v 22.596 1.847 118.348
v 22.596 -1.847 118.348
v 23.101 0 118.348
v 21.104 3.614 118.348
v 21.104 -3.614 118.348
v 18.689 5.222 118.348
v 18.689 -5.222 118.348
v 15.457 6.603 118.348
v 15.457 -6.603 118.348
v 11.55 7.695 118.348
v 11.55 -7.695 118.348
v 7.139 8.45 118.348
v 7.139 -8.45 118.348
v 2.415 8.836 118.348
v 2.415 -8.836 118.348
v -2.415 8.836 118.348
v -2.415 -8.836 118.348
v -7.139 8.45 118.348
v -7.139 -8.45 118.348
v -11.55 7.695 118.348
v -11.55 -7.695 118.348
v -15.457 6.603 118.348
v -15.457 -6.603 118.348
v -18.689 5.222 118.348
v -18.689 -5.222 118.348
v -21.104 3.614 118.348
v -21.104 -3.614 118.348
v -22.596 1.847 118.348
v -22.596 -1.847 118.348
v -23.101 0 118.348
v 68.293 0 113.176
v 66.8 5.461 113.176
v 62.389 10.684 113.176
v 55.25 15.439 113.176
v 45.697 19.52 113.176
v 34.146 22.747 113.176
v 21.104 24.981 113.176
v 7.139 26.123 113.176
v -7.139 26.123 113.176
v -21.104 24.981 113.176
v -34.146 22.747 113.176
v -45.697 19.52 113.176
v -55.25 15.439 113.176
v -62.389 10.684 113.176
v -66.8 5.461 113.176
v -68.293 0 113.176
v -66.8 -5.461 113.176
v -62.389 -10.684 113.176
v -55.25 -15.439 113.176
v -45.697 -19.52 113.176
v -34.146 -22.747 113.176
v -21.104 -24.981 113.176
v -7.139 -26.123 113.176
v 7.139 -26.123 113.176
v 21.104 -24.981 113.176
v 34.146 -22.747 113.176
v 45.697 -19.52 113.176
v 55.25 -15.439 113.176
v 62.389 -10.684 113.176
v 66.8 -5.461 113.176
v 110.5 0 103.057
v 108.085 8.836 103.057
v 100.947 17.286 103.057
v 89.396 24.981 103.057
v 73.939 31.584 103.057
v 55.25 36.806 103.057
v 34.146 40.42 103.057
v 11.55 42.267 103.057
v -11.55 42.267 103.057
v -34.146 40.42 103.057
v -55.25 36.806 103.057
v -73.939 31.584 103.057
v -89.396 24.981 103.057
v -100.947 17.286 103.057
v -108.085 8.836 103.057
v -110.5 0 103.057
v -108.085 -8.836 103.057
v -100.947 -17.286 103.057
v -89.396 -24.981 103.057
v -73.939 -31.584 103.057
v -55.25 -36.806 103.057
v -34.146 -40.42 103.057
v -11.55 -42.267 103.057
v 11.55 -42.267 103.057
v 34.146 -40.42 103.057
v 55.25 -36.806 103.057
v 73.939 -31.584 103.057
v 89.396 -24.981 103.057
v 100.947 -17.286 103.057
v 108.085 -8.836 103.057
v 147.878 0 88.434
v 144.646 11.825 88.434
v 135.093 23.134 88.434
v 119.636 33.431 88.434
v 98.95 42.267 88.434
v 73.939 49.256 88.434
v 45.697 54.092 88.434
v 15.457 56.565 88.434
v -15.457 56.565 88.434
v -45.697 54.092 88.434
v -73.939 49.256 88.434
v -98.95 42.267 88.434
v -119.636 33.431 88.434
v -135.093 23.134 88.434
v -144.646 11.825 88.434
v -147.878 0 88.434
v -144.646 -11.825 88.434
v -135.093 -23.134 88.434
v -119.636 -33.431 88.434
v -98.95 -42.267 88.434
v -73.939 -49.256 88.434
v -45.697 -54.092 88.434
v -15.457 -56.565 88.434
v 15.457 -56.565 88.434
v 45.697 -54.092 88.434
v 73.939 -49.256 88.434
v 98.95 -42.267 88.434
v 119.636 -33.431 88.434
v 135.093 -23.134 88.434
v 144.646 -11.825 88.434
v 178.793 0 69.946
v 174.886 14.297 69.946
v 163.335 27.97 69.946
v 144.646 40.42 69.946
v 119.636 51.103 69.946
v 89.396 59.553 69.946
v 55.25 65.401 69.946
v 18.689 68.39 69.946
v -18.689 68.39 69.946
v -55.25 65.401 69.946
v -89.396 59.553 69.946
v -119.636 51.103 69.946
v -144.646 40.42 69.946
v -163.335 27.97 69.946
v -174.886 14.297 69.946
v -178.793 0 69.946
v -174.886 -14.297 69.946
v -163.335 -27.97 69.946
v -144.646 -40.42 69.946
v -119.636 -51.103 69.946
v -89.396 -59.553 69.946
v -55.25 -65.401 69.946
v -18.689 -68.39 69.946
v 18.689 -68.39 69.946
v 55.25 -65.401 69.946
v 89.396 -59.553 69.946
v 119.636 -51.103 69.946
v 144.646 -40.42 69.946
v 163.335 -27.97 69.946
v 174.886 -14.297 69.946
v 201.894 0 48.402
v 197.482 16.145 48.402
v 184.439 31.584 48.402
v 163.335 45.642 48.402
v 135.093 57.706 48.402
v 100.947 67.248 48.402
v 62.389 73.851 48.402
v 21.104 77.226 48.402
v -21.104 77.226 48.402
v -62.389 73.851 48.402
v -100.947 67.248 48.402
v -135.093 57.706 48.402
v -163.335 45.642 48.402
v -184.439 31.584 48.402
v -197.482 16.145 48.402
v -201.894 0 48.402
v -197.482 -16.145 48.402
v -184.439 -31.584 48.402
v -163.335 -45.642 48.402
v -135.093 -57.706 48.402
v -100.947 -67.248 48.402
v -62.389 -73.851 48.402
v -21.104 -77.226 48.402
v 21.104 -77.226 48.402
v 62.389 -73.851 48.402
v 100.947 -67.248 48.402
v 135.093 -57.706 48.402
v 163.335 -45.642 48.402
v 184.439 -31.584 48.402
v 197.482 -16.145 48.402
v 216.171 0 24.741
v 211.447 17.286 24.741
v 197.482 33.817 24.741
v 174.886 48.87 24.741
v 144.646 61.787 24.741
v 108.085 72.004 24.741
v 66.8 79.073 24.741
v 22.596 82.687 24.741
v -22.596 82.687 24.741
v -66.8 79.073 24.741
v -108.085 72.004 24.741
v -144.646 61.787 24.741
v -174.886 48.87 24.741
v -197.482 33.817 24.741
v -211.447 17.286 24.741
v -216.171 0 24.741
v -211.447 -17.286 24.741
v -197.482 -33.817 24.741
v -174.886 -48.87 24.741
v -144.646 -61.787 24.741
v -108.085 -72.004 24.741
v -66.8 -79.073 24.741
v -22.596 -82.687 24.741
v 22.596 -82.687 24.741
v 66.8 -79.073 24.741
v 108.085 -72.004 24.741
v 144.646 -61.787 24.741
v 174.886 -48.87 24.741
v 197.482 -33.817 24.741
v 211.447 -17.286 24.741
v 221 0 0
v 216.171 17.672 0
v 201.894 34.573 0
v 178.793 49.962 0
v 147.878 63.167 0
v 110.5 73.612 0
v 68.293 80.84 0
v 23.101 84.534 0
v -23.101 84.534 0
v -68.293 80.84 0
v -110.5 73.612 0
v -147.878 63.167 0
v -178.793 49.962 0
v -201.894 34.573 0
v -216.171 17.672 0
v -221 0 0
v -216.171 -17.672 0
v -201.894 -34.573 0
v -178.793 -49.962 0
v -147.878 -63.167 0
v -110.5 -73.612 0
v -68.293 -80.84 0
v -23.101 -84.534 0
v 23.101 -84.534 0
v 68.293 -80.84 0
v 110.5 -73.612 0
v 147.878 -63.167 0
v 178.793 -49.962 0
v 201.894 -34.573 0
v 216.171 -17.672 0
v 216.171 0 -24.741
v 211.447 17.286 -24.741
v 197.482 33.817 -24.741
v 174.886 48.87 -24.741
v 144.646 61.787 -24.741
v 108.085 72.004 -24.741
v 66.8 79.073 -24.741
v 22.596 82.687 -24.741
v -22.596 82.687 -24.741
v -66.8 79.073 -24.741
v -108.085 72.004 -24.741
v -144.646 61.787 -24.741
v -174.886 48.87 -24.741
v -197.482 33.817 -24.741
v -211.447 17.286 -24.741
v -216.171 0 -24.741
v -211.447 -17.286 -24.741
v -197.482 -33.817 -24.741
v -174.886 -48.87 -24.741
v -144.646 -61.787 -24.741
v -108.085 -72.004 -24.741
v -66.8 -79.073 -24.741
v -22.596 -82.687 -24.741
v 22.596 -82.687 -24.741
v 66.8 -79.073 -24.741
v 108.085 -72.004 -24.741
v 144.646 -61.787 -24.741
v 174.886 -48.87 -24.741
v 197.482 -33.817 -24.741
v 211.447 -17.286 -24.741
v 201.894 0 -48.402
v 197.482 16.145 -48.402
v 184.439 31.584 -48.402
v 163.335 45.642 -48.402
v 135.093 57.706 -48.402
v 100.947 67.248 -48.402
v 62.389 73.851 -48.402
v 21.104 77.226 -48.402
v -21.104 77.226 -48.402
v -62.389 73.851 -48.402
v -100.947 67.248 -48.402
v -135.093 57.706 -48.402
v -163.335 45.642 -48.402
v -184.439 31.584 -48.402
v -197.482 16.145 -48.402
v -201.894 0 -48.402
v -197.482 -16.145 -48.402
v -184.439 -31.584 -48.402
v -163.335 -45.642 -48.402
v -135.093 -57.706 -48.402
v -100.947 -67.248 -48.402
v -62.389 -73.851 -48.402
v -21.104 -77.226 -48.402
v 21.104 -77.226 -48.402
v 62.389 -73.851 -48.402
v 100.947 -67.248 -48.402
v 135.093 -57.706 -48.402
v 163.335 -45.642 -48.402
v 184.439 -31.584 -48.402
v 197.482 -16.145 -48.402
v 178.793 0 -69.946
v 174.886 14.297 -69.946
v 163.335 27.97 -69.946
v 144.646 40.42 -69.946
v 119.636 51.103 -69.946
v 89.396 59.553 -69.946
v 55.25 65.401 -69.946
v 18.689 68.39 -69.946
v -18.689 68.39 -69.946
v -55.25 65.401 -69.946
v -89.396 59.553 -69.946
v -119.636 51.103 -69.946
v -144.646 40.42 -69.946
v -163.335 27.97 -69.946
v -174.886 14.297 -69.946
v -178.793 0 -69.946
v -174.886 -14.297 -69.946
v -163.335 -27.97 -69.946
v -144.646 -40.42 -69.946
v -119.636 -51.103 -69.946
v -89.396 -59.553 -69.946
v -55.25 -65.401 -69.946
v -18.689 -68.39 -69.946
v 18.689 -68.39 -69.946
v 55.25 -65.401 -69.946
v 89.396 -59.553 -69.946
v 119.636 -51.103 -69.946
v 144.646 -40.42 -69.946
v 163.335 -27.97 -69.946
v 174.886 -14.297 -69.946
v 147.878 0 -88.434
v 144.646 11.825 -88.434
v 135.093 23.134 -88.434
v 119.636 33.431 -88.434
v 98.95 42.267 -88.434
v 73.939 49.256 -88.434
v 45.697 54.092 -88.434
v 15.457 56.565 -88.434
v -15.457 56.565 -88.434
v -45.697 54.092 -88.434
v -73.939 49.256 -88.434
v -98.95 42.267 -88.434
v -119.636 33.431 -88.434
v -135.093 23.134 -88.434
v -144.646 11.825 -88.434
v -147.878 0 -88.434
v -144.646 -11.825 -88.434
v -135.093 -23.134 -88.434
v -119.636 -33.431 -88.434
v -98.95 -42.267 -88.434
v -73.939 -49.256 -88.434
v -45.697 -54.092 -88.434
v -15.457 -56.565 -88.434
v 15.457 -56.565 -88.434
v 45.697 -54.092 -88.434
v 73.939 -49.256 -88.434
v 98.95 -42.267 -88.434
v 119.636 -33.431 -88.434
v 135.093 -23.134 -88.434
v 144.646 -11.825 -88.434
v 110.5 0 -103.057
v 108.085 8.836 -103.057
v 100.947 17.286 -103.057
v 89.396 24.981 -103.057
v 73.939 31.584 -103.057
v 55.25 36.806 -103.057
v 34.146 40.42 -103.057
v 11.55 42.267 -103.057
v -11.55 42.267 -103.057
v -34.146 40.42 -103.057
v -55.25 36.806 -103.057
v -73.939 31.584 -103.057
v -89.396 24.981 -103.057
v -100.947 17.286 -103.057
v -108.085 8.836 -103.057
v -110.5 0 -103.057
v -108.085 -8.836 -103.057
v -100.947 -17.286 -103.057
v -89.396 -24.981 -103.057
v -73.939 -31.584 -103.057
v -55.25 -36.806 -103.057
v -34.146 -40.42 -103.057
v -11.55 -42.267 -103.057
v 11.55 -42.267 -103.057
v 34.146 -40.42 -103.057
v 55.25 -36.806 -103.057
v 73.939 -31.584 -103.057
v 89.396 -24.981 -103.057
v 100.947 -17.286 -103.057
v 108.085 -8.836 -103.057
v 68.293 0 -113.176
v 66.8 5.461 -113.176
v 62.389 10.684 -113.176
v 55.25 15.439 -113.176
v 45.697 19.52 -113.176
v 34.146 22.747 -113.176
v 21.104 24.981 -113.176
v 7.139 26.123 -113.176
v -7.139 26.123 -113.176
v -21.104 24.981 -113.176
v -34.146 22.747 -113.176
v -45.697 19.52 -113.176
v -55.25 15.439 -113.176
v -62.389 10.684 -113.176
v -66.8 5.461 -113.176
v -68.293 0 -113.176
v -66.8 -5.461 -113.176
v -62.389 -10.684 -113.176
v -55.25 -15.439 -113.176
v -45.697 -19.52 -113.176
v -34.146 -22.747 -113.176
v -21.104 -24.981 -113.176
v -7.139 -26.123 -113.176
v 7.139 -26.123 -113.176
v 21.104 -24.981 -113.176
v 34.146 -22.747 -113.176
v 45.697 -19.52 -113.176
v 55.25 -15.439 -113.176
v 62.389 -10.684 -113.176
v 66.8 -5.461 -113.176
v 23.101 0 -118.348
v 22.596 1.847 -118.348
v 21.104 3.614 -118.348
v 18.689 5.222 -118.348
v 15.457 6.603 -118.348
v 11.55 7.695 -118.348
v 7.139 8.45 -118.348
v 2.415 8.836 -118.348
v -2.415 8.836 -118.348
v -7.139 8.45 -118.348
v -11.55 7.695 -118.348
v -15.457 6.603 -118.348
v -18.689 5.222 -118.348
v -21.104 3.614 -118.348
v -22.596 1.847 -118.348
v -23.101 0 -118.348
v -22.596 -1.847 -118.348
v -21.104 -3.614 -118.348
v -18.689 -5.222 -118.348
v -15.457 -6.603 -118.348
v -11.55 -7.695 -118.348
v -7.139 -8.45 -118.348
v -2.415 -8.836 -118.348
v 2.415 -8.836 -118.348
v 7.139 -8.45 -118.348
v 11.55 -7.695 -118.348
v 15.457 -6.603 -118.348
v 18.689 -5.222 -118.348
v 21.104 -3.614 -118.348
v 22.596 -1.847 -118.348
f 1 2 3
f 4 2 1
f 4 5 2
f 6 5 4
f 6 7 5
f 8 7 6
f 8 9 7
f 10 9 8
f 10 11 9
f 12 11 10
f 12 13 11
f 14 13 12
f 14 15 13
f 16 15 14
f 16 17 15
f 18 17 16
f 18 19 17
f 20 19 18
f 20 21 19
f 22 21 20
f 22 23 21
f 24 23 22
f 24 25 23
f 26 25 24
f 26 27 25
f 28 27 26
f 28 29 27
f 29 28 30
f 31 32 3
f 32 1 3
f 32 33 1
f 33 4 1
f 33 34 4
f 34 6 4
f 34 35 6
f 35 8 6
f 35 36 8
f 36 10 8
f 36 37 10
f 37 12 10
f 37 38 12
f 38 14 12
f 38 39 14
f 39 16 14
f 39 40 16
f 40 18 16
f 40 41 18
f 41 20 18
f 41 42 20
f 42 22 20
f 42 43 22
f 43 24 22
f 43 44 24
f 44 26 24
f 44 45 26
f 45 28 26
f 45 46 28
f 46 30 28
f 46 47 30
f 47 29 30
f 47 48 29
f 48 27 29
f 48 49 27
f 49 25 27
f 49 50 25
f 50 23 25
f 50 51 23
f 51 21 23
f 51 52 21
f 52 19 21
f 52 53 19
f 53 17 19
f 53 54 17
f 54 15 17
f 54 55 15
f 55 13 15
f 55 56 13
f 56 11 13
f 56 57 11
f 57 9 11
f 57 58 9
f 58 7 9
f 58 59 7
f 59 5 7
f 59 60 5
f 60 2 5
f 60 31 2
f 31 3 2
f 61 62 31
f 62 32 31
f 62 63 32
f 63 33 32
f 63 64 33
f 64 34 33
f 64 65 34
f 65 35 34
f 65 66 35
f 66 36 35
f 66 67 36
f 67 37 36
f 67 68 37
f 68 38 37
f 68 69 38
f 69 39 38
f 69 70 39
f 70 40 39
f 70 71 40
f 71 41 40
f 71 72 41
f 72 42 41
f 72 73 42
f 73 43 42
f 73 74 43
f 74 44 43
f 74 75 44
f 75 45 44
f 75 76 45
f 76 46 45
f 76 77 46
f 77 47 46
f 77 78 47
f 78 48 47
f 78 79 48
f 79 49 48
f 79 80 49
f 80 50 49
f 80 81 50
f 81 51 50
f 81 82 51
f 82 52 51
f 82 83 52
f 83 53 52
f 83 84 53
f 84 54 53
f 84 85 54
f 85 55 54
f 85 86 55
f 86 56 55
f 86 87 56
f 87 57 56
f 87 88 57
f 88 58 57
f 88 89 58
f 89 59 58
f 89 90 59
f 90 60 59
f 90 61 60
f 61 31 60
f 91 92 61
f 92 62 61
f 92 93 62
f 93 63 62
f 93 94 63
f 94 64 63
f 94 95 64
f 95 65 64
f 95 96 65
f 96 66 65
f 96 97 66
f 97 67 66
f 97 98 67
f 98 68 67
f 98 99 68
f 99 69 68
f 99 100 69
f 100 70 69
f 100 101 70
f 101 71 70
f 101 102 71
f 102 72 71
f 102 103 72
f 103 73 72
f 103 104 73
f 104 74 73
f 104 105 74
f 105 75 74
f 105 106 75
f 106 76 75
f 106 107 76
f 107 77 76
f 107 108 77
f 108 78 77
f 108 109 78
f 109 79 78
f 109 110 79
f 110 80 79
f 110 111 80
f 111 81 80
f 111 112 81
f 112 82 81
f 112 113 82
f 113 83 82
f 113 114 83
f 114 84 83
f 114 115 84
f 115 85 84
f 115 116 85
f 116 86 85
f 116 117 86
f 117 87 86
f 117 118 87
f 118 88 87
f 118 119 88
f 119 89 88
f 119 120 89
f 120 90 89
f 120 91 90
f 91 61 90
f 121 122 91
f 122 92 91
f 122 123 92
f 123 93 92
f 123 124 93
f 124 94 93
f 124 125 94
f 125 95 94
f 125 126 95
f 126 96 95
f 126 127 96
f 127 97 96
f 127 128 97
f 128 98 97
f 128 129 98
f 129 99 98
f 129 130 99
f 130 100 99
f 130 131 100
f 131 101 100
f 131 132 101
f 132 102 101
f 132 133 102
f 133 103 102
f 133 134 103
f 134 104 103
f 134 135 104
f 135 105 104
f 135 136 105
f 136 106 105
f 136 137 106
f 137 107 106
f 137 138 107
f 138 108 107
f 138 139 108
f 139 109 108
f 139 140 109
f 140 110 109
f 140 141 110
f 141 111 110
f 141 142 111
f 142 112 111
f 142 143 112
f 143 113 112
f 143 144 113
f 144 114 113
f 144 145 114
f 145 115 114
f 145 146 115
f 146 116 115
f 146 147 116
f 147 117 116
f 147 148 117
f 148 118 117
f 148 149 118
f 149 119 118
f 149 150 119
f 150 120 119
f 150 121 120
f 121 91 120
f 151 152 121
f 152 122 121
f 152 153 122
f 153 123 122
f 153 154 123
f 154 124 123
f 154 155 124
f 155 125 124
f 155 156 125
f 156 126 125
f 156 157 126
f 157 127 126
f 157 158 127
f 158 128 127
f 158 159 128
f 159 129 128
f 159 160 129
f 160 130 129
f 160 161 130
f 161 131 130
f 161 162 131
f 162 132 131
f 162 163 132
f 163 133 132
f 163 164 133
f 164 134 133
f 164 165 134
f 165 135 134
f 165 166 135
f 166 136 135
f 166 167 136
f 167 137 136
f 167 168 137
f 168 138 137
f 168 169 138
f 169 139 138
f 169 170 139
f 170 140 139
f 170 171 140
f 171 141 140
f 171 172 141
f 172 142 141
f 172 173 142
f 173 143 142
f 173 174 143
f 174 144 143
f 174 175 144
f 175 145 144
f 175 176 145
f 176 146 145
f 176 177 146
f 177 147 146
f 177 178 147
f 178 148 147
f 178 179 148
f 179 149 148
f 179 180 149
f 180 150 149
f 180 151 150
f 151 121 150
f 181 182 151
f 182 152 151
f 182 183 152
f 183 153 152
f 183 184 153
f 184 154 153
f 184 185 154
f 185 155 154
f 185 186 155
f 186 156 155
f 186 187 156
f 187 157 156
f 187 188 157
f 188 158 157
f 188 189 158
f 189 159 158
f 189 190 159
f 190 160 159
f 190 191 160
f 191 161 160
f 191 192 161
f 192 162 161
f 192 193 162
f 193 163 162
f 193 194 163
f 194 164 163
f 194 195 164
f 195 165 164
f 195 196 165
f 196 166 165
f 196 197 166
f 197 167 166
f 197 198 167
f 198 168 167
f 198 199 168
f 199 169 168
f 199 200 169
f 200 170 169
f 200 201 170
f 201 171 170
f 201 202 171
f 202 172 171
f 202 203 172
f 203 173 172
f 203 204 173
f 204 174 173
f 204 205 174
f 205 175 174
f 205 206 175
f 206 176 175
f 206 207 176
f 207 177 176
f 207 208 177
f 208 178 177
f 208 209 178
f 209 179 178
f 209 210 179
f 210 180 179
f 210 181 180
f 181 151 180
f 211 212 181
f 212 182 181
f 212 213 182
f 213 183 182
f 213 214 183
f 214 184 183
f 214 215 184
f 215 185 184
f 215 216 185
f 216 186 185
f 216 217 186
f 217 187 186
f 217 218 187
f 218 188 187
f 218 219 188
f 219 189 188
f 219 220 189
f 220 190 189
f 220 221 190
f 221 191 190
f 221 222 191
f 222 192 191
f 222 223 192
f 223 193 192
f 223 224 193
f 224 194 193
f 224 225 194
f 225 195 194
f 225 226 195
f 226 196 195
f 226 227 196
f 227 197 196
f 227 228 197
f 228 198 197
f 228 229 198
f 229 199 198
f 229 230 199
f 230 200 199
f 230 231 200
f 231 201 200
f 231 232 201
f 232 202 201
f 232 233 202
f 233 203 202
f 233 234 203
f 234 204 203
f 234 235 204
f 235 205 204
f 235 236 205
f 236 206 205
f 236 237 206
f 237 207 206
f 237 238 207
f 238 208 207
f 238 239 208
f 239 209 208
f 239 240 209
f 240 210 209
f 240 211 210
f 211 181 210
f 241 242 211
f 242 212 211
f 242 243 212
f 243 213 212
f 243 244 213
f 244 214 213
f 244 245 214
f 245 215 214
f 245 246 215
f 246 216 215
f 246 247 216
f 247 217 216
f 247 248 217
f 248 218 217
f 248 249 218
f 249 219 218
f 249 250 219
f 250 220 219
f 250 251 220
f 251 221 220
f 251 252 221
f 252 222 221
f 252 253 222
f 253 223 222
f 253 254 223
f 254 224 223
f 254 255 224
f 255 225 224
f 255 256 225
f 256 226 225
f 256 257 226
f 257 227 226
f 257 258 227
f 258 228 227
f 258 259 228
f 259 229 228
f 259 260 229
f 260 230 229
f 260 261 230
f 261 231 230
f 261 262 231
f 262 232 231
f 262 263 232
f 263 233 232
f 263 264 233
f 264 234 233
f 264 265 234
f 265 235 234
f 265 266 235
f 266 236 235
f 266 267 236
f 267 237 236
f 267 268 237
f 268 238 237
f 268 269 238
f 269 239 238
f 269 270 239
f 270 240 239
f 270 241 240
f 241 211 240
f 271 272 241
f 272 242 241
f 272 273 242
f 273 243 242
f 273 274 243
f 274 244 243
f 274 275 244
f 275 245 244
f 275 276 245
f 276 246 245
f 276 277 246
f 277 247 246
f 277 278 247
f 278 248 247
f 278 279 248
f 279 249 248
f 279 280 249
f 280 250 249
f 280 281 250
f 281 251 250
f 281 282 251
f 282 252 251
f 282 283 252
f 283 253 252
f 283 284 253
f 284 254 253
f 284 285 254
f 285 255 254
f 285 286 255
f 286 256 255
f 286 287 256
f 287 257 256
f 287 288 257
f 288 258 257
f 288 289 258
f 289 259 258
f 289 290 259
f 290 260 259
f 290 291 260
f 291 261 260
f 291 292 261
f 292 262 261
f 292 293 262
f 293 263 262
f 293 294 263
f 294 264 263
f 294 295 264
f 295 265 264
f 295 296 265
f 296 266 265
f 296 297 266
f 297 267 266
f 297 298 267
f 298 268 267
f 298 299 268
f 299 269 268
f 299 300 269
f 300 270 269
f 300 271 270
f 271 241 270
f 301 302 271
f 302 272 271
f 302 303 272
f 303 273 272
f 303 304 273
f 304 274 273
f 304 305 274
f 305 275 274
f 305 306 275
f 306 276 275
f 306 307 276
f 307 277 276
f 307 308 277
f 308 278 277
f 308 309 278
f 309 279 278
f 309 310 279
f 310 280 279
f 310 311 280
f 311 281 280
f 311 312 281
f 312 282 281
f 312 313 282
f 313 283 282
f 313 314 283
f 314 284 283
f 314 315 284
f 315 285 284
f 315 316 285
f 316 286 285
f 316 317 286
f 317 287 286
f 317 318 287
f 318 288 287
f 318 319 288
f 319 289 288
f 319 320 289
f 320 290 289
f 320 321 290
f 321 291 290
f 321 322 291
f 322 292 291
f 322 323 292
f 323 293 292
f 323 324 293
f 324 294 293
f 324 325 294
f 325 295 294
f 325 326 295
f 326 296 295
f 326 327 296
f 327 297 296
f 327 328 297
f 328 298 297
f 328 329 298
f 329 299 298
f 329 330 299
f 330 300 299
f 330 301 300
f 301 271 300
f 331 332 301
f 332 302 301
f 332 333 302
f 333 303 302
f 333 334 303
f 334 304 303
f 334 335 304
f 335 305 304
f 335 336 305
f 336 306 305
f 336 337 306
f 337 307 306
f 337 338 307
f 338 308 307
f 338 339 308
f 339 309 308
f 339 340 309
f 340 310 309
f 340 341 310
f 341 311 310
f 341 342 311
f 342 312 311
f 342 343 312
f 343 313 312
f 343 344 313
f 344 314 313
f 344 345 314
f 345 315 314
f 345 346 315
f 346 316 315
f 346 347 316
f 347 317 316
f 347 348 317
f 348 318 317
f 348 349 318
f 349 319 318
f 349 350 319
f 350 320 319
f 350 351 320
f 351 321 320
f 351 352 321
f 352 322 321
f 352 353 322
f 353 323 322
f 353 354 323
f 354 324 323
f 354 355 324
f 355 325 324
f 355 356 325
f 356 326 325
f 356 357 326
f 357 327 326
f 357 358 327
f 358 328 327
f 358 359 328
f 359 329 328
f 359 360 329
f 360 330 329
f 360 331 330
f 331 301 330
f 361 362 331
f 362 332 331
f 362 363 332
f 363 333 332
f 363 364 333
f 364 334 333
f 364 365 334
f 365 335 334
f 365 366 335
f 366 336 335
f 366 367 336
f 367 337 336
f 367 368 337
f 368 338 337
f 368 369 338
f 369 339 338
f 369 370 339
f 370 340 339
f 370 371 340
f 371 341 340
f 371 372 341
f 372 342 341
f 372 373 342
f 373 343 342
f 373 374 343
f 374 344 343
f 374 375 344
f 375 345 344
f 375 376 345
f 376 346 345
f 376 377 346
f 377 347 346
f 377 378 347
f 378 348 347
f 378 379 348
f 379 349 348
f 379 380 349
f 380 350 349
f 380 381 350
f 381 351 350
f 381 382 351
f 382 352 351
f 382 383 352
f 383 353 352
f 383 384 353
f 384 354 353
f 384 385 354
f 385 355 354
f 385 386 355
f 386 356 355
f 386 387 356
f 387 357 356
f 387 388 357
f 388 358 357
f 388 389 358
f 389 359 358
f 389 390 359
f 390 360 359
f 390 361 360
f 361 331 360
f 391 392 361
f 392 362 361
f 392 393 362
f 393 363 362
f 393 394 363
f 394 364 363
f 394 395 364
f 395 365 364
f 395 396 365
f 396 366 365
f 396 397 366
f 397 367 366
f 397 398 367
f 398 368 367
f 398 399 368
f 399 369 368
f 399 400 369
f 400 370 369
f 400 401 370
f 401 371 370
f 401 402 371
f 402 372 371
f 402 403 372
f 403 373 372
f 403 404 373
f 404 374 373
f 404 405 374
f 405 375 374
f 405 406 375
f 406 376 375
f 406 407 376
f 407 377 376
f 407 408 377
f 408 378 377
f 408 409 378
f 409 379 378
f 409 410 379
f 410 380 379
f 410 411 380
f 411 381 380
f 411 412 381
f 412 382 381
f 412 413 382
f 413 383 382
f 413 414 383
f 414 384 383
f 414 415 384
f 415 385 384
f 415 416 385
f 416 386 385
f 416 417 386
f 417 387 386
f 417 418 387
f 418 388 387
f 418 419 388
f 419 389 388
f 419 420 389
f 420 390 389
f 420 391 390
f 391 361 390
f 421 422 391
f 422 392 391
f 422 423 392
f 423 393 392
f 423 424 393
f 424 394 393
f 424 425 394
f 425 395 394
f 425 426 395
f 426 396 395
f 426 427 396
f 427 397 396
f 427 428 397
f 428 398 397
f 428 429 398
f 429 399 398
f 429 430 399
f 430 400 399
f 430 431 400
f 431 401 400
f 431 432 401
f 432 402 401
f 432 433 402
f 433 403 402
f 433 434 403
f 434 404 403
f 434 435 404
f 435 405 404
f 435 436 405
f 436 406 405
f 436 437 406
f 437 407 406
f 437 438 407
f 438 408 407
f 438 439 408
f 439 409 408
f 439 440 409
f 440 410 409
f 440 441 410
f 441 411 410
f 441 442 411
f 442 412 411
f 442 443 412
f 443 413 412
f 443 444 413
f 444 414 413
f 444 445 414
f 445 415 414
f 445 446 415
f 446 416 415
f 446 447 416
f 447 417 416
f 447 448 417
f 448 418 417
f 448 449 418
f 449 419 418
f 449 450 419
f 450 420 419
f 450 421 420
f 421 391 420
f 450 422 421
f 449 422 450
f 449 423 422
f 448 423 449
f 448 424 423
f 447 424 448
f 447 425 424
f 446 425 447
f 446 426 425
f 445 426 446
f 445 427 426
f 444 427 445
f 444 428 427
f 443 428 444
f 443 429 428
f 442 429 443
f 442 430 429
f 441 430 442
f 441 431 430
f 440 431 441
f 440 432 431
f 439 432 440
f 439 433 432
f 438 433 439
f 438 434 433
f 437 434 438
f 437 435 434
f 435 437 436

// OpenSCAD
// Generated by SolidPython 1.0.1 on 2020-07-29 00:46:50


scale(v = [13, 5, 7]) {
	sphere(r = 17);
}
/***********************************************
*********      SolidPython code:      **********
************************************************
 
# import packages: SolidPython
from solid import *
from solid.utils import *
from itertools import chain, combinations, permutations


class Resize:

    def __init__(self, scad_file):
        self.scad_file = scad_file
        #self.scad_file = import_scad(scad_file)
        # cone/cylinder param:
        self.r1 = 0
        self.r2 = 0
        self.h = 0
        # rectangular prism param:
        self.w = 0
        self.l = 0
        # ellipse param:
        self.r = 0

    # import OpenScad code (file name corresponds to shape)


    # classify shape + parameters
    def assign(self, param1, param2, param3):
        if self.scad_file == 'cone.scad':
            self.r1 = param1
            self.r2 = param2
            self.h = param3
        elif self.scad_file == 'cylinder.scad':
            self.r1 = param1
            self.r2 = param2
            self.h = param3
        elif self.scad_file == 'rectangularPrism.scad':
            self.h = param1
            self.l = param2
            self.w = param3
        else:
            self.r = param1
            self.h = param2

    # resize parameters
    def iterate(self):
        x = range(3, 20, 2)
        i = 1
        if self.scad_file == 'cone.scad':
            tempList = list(permutations(x, 2))
            for temp in tempList:
                param1 = temp[0]
                param2 = temp[1]
                filepath = 'produced_scad_files/' + 'cone' + str(param1) + '_' + str(param2) + '_' + '.scad'
                scad_render_to_file(cylinder(h=param1, r1=param2, r2=0), filepath)

        elif self.scad_file == 'cylinder.scad':
            tempList = list(permutations(x, 3))
            for temp in tempList:
                param1 = temp[0]
                param2 = temp[1]
                filepath = 'produced_scad_files/' + 'cylinder' + str(param1) + '_' + str(param2) + '_' + '.scad'
                scad_render_to_file(cylinder(h=param1, r1=param2, r2=param2), filepath)

        elif self.scad_file == 'rectangularPrism.scad':
            tempList = list(permutations(x, 3))
            for temp in tempList:
                param1 = temp[0]
                param2 = temp[1]
                param3 = temp[2]
                filepath = 'produced_scad_files/' + 'rectangularPrism' + str(param1) + '_' + str(param2) + '_' + str(
                    param3) + '.scad'
                scad_render_to_file(cube(size=(param1, param2, param3)), filepath)

        elif self.scad_file == 'ellipse.scad':
            tempList = list(permutations(x, 4))
            for temp in tempList:
                param1 = temp[0]
                param2 = temp[1]
                param3 = temp[2]
                param4 = temp[3]
                filepath = 'produced_scad_files/' + 'ellipse' + str(param1) + '_' + str(param2) + '_' + str(param3) + '_' + str(param4) + '.scad'
                scad_render_to_file(scale([param1, param2, param3])(sphere(r=param4)), filepath)

    def render_to_scadfile(self):
        scad_render_to_file(scad, 'example.scad') 
 
************************************************/
